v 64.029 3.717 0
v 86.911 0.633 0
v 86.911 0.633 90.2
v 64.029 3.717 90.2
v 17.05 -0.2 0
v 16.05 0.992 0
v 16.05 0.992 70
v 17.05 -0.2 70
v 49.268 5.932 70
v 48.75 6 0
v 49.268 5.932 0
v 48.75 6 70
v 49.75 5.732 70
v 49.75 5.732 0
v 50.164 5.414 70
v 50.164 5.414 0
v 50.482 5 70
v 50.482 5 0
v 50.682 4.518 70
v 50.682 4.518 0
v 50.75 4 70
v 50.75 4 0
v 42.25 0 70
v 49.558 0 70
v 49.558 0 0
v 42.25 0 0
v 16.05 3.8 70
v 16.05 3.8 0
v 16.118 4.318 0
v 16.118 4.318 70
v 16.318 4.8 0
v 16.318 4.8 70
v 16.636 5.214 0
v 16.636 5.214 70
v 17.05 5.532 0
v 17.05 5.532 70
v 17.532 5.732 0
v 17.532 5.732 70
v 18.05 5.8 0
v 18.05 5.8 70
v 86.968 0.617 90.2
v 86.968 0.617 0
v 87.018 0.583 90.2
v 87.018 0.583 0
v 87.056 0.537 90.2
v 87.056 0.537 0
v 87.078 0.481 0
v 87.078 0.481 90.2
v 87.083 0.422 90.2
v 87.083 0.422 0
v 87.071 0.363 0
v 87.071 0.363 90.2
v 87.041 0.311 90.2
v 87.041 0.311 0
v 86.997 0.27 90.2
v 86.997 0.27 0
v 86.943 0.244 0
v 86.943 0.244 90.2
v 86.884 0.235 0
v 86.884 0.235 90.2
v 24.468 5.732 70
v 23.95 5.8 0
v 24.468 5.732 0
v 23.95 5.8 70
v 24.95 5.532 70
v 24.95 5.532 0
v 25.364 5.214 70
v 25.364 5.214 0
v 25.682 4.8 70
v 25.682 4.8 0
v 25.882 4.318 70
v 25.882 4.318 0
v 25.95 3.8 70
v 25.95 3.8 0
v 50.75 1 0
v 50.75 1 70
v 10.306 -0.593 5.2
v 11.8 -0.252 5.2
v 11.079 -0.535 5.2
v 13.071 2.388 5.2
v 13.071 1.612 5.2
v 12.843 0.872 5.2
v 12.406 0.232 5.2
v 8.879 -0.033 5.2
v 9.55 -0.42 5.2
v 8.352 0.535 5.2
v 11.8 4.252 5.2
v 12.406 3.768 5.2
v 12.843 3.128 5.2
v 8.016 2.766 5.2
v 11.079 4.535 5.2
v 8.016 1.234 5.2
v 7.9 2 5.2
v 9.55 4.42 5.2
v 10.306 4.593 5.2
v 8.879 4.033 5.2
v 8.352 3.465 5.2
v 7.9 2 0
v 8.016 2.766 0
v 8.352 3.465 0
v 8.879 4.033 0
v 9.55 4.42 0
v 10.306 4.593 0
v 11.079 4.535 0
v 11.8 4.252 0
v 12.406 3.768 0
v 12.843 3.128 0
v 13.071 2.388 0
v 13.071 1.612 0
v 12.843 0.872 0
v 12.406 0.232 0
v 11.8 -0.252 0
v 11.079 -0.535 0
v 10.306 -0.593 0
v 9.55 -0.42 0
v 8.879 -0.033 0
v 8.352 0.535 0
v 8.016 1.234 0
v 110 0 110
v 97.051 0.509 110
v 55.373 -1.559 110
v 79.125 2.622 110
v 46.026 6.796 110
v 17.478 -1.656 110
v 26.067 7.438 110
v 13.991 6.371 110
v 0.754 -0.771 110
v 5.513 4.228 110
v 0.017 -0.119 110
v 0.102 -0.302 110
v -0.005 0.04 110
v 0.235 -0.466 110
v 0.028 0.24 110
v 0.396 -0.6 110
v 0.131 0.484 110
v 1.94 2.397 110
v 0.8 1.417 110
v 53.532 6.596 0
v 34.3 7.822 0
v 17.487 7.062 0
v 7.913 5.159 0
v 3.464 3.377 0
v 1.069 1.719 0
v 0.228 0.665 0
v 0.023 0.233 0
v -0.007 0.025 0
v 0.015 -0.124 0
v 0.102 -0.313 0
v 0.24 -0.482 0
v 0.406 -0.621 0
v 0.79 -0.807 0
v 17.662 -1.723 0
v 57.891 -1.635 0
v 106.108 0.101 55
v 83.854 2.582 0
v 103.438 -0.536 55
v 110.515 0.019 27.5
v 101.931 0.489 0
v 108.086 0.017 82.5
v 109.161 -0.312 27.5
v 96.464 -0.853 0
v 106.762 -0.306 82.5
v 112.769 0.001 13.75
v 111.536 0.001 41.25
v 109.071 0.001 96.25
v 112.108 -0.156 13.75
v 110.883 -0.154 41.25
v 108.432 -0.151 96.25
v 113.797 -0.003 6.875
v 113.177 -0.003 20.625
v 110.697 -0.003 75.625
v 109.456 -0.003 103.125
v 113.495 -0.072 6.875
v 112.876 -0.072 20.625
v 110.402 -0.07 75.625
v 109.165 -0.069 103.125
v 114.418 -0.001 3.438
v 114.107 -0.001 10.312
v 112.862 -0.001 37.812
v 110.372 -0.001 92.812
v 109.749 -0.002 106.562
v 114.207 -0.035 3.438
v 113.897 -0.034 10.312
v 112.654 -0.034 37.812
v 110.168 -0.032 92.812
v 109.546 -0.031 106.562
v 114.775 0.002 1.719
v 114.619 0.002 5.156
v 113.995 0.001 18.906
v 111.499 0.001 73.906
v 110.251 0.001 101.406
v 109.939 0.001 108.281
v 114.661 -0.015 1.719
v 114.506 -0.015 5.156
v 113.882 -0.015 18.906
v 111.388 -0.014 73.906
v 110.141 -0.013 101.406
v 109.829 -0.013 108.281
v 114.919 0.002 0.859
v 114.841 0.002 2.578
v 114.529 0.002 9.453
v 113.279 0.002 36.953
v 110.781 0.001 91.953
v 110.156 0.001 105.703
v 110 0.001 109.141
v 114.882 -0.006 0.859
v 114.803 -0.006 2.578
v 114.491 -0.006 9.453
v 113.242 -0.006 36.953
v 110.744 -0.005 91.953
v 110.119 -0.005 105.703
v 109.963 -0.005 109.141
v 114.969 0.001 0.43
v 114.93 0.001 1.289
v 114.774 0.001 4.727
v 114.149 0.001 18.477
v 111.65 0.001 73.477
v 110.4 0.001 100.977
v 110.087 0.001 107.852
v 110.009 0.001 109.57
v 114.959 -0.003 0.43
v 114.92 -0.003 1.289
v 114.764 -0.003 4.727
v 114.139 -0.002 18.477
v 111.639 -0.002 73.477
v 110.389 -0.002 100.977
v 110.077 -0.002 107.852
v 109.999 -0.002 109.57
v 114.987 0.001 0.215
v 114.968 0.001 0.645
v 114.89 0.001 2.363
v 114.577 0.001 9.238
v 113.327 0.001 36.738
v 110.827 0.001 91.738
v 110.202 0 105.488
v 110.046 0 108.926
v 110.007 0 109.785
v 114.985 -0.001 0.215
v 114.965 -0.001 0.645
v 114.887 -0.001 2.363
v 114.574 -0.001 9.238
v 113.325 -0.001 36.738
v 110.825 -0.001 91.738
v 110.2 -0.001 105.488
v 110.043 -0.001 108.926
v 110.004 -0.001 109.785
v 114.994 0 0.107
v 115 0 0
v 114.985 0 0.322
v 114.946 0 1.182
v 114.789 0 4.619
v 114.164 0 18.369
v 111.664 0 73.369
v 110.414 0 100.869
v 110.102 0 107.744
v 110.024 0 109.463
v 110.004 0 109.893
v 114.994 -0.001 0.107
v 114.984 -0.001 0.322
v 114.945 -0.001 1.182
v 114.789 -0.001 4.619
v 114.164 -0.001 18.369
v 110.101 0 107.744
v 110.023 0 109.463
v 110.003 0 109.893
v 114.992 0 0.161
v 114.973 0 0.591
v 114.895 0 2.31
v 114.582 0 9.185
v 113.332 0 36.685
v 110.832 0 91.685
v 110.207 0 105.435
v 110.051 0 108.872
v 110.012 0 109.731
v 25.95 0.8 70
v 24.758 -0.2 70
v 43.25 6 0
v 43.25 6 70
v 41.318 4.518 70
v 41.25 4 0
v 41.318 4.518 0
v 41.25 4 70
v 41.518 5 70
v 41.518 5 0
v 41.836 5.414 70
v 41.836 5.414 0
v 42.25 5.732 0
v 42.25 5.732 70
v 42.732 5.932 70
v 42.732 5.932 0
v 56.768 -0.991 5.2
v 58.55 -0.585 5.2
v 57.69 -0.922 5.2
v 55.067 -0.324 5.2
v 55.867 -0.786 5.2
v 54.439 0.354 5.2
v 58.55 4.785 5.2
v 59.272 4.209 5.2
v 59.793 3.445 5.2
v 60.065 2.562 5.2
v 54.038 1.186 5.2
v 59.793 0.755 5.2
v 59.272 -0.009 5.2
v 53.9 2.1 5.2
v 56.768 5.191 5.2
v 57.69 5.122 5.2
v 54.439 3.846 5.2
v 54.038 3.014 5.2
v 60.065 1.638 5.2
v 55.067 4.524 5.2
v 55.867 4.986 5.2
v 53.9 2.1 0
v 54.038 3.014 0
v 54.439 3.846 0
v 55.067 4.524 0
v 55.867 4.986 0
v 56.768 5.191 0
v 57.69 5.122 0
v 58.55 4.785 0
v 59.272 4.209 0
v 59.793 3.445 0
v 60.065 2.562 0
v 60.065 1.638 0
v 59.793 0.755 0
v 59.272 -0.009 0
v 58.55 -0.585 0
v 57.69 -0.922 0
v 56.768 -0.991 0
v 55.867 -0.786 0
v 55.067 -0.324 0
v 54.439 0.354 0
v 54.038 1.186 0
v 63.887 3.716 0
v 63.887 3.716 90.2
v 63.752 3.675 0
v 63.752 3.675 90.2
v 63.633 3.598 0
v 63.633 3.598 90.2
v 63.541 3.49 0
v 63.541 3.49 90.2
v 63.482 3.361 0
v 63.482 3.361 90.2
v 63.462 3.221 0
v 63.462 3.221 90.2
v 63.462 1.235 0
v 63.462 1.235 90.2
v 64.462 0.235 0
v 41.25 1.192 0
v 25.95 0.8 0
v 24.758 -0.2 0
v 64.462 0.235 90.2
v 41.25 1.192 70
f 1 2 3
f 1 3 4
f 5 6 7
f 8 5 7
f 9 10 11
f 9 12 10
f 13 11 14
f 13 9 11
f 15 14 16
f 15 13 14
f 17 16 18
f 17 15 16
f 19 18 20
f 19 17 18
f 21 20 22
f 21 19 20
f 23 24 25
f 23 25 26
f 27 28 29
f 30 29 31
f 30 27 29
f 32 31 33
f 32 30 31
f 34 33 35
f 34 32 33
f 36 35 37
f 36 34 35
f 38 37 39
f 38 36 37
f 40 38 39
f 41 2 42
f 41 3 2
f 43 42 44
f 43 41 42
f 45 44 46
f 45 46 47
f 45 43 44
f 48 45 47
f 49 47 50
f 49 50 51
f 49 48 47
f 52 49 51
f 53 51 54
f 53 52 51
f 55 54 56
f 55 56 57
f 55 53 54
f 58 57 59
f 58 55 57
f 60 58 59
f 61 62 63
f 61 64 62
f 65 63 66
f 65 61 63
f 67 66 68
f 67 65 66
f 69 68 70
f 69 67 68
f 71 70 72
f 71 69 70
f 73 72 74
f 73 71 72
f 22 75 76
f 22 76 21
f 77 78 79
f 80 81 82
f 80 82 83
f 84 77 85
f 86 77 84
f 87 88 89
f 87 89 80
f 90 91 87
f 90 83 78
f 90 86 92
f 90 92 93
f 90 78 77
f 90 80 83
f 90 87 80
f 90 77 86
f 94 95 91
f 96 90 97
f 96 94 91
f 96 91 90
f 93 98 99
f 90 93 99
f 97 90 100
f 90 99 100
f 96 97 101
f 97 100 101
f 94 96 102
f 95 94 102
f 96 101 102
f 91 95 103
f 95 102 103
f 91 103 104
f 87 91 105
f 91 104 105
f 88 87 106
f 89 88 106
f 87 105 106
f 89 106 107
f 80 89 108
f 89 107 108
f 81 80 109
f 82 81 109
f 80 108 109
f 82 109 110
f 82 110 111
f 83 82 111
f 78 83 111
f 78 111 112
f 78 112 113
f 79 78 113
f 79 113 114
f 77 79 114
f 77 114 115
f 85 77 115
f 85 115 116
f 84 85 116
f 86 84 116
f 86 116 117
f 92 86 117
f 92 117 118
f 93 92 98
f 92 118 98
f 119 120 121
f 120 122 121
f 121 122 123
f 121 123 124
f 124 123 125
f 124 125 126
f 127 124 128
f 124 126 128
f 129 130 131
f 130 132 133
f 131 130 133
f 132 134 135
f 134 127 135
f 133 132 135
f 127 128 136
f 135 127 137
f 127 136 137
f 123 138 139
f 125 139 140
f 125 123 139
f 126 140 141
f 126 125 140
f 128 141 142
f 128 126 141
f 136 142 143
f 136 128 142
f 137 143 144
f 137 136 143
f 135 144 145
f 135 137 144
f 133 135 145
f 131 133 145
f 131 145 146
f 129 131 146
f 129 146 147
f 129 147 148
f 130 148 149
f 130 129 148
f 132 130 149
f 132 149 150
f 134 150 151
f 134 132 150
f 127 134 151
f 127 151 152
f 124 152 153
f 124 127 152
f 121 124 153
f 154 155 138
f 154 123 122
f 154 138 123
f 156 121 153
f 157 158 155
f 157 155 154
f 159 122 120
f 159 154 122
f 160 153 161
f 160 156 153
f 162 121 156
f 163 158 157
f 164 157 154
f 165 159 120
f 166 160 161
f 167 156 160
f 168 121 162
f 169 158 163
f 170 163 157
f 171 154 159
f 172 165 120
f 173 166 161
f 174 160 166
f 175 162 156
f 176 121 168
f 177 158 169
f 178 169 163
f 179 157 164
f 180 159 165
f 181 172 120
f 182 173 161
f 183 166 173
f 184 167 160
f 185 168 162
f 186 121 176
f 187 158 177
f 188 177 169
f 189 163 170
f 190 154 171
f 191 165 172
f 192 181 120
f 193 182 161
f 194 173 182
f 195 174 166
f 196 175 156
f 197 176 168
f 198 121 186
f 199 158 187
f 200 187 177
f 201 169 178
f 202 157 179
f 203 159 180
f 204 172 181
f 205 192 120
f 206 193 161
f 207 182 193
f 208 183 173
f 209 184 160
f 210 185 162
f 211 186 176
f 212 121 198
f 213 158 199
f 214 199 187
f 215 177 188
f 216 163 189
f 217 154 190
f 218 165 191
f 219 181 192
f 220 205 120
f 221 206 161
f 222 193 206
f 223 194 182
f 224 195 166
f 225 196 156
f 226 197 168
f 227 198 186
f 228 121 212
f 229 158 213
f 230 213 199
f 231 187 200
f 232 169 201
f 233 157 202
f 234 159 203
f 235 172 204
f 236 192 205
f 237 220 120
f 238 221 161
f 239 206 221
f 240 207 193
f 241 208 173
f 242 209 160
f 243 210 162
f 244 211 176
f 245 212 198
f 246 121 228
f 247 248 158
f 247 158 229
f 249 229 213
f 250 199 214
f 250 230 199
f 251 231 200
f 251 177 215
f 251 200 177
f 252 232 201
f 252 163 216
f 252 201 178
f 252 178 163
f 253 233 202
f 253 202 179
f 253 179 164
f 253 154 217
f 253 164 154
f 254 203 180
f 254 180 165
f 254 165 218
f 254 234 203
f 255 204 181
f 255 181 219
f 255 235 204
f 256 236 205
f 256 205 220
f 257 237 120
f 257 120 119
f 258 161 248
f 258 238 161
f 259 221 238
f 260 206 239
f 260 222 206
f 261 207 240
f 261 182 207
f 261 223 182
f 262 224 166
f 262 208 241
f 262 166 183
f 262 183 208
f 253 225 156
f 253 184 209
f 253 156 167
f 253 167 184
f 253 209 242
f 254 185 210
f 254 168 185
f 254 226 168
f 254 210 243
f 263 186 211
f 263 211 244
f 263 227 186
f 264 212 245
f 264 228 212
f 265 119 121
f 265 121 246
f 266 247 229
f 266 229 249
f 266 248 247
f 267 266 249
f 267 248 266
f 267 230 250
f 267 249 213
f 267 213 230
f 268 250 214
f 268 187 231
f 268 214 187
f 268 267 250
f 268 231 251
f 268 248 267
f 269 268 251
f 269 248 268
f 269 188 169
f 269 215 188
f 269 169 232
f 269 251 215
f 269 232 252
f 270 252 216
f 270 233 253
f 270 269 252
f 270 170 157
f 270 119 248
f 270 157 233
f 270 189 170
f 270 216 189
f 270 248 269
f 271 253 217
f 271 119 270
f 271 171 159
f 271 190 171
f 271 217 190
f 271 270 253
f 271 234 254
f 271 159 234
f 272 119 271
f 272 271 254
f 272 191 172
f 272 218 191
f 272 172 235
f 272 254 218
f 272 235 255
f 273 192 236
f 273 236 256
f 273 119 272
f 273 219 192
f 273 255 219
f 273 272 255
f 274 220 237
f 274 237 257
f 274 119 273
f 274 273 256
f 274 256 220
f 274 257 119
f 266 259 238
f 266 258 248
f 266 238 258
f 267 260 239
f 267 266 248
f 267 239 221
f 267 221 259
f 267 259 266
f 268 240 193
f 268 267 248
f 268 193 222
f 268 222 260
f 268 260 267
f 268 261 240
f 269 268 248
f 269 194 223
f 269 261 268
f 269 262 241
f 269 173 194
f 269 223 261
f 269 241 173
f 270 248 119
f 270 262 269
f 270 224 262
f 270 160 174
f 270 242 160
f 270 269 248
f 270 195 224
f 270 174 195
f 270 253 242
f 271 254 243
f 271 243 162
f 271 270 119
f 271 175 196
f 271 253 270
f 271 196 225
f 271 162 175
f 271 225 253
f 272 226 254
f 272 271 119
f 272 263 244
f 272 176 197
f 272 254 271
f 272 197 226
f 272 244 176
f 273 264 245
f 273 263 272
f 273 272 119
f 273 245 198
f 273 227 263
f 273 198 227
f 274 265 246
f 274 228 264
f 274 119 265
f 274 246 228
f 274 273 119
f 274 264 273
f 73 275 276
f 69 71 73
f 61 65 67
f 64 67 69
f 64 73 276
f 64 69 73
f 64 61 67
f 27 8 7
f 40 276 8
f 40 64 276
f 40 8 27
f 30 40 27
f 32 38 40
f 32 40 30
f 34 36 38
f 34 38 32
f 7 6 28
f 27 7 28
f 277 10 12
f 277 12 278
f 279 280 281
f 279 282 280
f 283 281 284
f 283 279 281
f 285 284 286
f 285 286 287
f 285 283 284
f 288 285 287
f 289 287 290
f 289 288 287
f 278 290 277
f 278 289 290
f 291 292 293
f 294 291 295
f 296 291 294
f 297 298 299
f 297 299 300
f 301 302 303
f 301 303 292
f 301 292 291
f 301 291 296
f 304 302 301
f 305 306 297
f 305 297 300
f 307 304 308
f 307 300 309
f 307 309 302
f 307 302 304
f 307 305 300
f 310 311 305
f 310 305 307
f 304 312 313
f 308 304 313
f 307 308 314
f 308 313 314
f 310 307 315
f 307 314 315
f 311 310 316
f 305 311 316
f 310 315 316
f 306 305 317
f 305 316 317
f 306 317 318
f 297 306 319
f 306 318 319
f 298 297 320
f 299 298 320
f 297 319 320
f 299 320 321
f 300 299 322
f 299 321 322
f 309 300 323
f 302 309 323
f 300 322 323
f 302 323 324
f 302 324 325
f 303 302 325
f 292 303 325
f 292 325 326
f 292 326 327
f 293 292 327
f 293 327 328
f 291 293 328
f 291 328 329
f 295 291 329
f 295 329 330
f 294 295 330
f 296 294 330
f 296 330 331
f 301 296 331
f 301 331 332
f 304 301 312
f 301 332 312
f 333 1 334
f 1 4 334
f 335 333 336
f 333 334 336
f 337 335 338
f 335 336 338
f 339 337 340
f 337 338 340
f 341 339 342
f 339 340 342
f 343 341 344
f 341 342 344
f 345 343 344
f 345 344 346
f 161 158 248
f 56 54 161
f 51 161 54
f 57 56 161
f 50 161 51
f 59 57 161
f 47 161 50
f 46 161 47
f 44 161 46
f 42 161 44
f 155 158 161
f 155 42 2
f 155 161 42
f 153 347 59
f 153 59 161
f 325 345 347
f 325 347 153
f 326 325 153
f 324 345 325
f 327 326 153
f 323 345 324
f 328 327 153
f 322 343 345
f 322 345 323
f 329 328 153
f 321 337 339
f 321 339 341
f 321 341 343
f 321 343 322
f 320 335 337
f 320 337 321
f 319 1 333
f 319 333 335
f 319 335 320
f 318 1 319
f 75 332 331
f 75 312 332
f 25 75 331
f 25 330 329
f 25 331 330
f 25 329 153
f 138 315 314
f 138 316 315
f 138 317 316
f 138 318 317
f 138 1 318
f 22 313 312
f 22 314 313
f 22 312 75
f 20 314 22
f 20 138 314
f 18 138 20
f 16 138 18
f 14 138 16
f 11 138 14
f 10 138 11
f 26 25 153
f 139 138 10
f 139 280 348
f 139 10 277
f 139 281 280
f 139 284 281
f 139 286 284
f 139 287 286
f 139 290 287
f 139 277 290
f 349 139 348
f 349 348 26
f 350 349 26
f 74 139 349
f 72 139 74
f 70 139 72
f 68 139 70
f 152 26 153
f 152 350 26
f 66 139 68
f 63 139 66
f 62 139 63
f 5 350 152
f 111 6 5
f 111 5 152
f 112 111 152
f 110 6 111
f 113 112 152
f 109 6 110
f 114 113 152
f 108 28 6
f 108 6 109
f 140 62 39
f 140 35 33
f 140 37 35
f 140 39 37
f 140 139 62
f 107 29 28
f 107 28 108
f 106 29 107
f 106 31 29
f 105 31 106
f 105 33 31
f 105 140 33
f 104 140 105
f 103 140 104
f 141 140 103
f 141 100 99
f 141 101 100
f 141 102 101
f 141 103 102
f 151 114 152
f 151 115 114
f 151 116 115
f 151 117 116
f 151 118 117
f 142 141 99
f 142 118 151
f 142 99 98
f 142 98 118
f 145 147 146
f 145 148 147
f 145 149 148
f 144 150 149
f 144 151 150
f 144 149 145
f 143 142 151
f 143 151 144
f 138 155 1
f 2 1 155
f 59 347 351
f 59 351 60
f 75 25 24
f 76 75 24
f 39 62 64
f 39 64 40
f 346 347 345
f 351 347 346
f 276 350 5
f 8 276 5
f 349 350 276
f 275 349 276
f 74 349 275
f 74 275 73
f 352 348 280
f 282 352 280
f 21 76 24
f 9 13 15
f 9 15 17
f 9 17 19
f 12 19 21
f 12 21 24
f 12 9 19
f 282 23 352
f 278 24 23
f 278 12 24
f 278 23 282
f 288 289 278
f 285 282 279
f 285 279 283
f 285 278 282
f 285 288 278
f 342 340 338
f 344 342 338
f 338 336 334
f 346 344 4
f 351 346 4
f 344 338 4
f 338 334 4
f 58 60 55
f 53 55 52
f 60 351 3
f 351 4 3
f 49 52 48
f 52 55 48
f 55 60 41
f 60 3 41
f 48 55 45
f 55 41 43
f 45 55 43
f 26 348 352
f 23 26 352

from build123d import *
from OCP.BRepFilletAPI import BRepFilletAPI_MakeChamfer

# Parameters (mm, degrees)
SKETCH4_R          = 2.6
SKETCH4_R_2        = 3.1
CUT_EXTRUDE1_DEPTH = 5.2
SKETCH5_W          = 9.9
SKETCH5_H          = 6
SKETCH5_W_2        = 9.5
CUT_EXTRUDE2_DEPTH = 70
FILLET3_R          = 2
CHAMFER1_SIZE      = 1
CHAMFER1_SIZE2     = 1.191753593
CUT_EXTRUDE3_DEPTH = 90.2
FILLET4_R          = 0.2
FILLET5_R          = 0.5
CHAMFER2_SIZE      = 1


with BuildPart() as part:
    # Sketch1 → Loft1 section 0
    with BuildSketch(Plane.XY):
        with BuildLine():
            add(Edge.make_bspline(
                [(115, 0), (114.999913382, 0.00327866), (114.222934603, -0.004567066), (113.418136575, 0.000318408), (111.44543546, 0.018706002), (108.999380922, 0.080565277), (105.780115155, 0.203144323), (101.978037922, 0.467320429), (97.63148646, 0.880990765), (92.843812566, 1.427373326), (87.693014802, 2.062174327), (82.26127365, 2.794917392), (76.628898252, 3.582200475), (70.875421432, 4.408274793), (65.069516957, 5.204495648), (59.272555938, 5.964988559), (53.535411353, 6.612069385), (47.902032041, 7.147901639), (42.420677472, 7.538059951), (37.125743857, 7.784294524), (32.060080889, 7.863888962), (27.260899934, 7.799703202), (22.764274035, 7.585443948), (18.606628598, 7.224009749), (14.819582747, 6.717397261), (11.43119341, 6.102885155), (8.463318021, 5.359495242), (5.929953708, 4.523167874), (3.840235227, 3.611431652), (2.203139301, 2.680524392), (0.997143498, 1.719388226), (0.306055902, 0.84473605), (-0.153897847, -0.016785493), (0.441131195, -0.783771302), (1.630250645, -0.976182526), (3.345026164, -1.247099953), (5.741349663, -1.385446358), (8.741002332, -1.531007587), (12.32356917, -1.613427576), (16.426146399, -1.711956772), (20.996614723, -1.764001286), (25.979915364, -1.804105207), (31.316658928, -1.826220598), (36.950031377, -1.811871436), (42.810070502, -1.783755804), (48.833365319, -1.730024981), (54.950109545, -1.67348399), (61.093513049, -1.595166549), (67.193299365, -1.488121719), (73.176935484, -1.397778739), (78.980025922, -1.271232402), (84.533413271, -1.152999753), (89.776869938, -1.037364871), (94.647010434, -0.905039683), (99.089599698, -0.778312882), (103.055602703, -0.646322839), (106.488295637, -0.529569147), (109.391284428, -0.370730171), (111.629000068, -0.244208643), (113.467096811, -0.099576309), (114.237158295, -0.036931621), (115.000086752, -0.003283716), (115, 0)],
                knots=[0, 0, 0, 0, 0.001545172, 0.006223608, 0.014035782, 0.024855049, 0.038644124, 0.055163693, 0.074045466, 0.094820373, 0.117222732, 0.140866367, 0.165395395, 0.190452399, 0.215710088, 0.240854358, 0.265734023, 0.290048364, 0.313714428, 0.336486101, 0.358292895, 0.378940292, 0.398278007, 0.416246563, 0.432660408, 0.447459903, 0.460566131, 0.472021733, 0.481783695, 0.489844359, 0.496307136, 0.50126117, 0.504695153, 0.507385543, 0.512190444, 0.519692984, 0.529980259, 0.542956454, 0.558414131, 0.576101982, 0.595804604, 0.61726601, 0.64027206, 0.66452271, 0.689803764, 0.7157292, 0.742084221, 0.768568973, 0.794840399, 0.820639753, 0.845625339, 0.869581038, 0.892163588, 0.913159587, 0.932310678, 0.94940252, 0.964220925, 0.976641917, 0.986532119, 0.993892864, 0.998452446, 1, 1, 1, 1], degree=3))
        make_face()
    # Sketch2 → Loft1 section 1
    with BuildSketch(Plane.XY.offset(110)):
        with BuildLine():
            add(Edge.make_bspline(
                [(110, 0), (110.000464145, 0.002638021), (109.253557002, -0.006421882), (108.485306247, 0.00202473), (106.599515685, 0.014018922), (104.259903283, 0.071192731), (101.178986874, 0.200889618), (97.542661477, 0.451950761), (93.384633146, 0.843539364), (88.805204424, 1.362015696), (83.880374164, 1.978555721), (78.68657223, 2.677523385), (73.299477431, 3.430735281), (67.795235431, 4.215247142), (62.241233075, 4.984660857), (56.695525551, 5.697469803), (51.207787306, 6.322755672), (45.821489693, 6.833626486), (40.577824462, 7.211562863), (35.514283248, 7.444282984), (30.668486135, 7.527509184), (26.076763803, 7.463490784), (21.77566696, 7.255221358), (17.798933432, 6.909184212), (14.177047879, 6.430194992), (10.935139134, 5.831964767), (8.094704102, 5.122344568), (5.670248347, 4.327180111), (3.669790047, 3.460558372), (2.10909167, 2.56151381), (0.952680778, 1.647952784), (0.292493833, 0.810328248), (-0.144477468, -0.013443729), (0.421457768, -0.751792674), (1.561430619, -0.927732015), (3.196411713, -1.199647616), (5.489901797, -1.325203312), (8.359384575, -1.457341268), (11.786506209, -1.55318322), (15.712038629, -1.632817261), (20.085890157, -1.693490267), (24.85332264, -1.730533844), (29.958495668, -1.745317698), (35.344133299, -1.736641885), (40.949025669, -1.70754651), (46.710109342, -1.660092686), (52.562107594, -1.595708584), (58.438334584, -1.519615465), (64.272360823, -1.429130605), (69.997133878, -1.329443239), (75.548112692, -1.222377083), (80.861507128, -1.10840335), (85.876724326, -0.990587124), (90.536246874, -0.869398239), (94.784781842, -0.746694986), (98.577741113, -0.621781265), (101.858350076, -0.496229968), (104.635869759, -0.366297292), (106.773720091, -0.224338993), (108.53252638, -0.099668194), (109.269457647, -0.031974616), (109.999539654, -0.002616432), (110, 0)],
                knots=[0, 0, 0, 0, 0.001564721, 0.006239121, 0.014018617, 0.024861007, 0.038659987, 0.055174427, 0.074046407, 0.094837256, 0.117226118, 0.14085626, 0.165386109, 0.19045125, 0.215702393, 0.240866612, 0.265718976, 0.290051983, 0.313696202, 0.33648442, 0.358279861, 0.378929437, 0.398292398, 0.416235766, 0.432650472, 0.447455618, 0.460592079, 0.472030369, 0.48177877, 0.489853088, 0.496315276, 0.501246195, 0.504684904, 0.507403743, 0.512183233, 0.519672773, 0.529968131, 0.54294809, 0.558399818, 0.576099165, 0.595810572, 0.617282889, 0.64027984, 0.664535393, 0.689783385, 0.715732831, 0.742092653, 0.768566703, 0.794844175, 0.820638712, 0.845644257, 0.86958445, 0.892182833, 0.913177877, 0.932327829, 0.949410904, 0.964230176, 0.976629486, 0.986536787, 0.993881551, 0.998448084, 1, 1, 1, 1], degree=3))
        make_face()
    loft()

    # Sketch4 → Cut-Extrude1 (cut)
    with BuildSketch(Plane(origin=(0, 0, 0), x_dir=(-1, 0, 0), z_dir=(0, 0, -1))):
        with Locations((-10.5, 2)):
            Circle(SKETCH4_R)
        with Locations((-57, 2.1)):
            Circle(SKETCH4_R_2)
    extrude(amount=-CUT_EXTRUDE1_DEPTH, mode=Mode.SUBTRACT)

    # Sketch5 → Cut-Extrude2 (cut)
    with BuildSketch(Plane(origin=(0, 0, 0), x_dir=(-1, 0, 0), z_dir=(0, 0, -1))):
        with Locations((-21, 2.8)):
            Rectangle(SKETCH5_W, SKETCH5_H)
        with Locations((-46, 3)):
            Rectangle(SKETCH5_W_2, SKETCH5_H)
    extrude(amount=-CUT_EXTRUDE2_DEPTH, mode=Mode.SUBTRACT)

    # Fillet3
    fillet3_edges = [part.edges().sort_by_distance(p)[0] for p in [
        (16.05, 5.8, 35),
        (25.95, 5.8, 35),
        (41.25, 6, 35),
        (50.75, 6, 35),
    ]]
    fillet(fillet3_edges, radius=FILLET3_R)

    # Chamfer1: one chamfer whose edges measure the first distance from different faces: ONE call of the kernel's chamfer builder (chamfer() names one face for all edges)
    chamfer1_edges_1 = [part.edges().sort_by_distance(p)[0] for p in [
        (16.05, -0.2, 35),
    ]]
    chamfer1_side_1 = [part.faces().sort_by_distance(p)[0] for p in [
        (21, -0.2, 35),
    ]]
    chamfer1_edges_2 = [part.edges().sort_by_distance(p)[0] for p in [
        (25.95, -0.2, 35),
    ]]
    chamfer1_side_2 = [part.faces().sort_by_distance(p)[0] for p in [
        (25.95, 1.8, 35),
    ]]
    chamfer1_edges_3 = [part.edges().sort_by_distance(p)[0] for p in [
        (41.25, 0, 35),
    ]]
    chamfer1_side_3 = [part.faces().sort_by_distance(p)[0] for p in [
        (46, 0, 35),
    ]]
    chamfer1_edges_4 = [part.edges().sort_by_distance(p)[0] for p in [
        (50.75, 0, 35),
    ]]
    chamfer1_side_4 = [part.faces().sort_by_distance(p)[0] for p in [
        (50.75, 2, 35),
    ]]
    chamfer1 = BRepFilletAPI_MakeChamfer(part.part.solid().wrapped)
    for e in chamfer1_edges_1:
        chamfer1.Add(CHAMFER1_SIZE, CHAMFER1_SIZE2, e.wrapped, chamfer1_side_1[0].wrapped)  # the first distance lies on this face
    for e in chamfer1_edges_2:
        chamfer1.Add(CHAMFER1_SIZE, CHAMFER1_SIZE2, e.wrapped, chamfer1_side_2[0].wrapped)  # the first distance lies on this face
    for e in chamfer1_edges_3:
        chamfer1.Add(CHAMFER1_SIZE, CHAMFER1_SIZE2, e.wrapped, chamfer1_side_3[0].wrapped)  # the first distance lies on this face
    for e in chamfer1_edges_4:
        chamfer1.Add(CHAMFER1_SIZE, CHAMFER1_SIZE2, e.wrapped, chamfer1_side_4[0].wrapped)  # the first distance lies on this face
    add(Compound.cast(chamfer1.Shape()), mode=Mode.REPLACE)

    # Sketch6 → Cut-Extrude3 (cut)
    with BuildSketch(Plane(origin=(0, 0, 0), x_dir=(-1, 0, 0), z_dir=(0, 0, -1))):
        Polygon((-63.462295223, 3.793174257), (-63.462295223, 0.235158592), (-89.865630471, 0.235158592), align=None)
    extrude(amount=-CUT_EXTRUDE3_DEPTH, mode=Mode.SUBTRACT)

    # Fillet4
    fillet4_edges = [part.edges().sort_by_distance(p)[0] for p in [
        (89.865630471, 0.235158592, 45.1),
    ]]
    fillet(fillet4_edges, radius=FILLET4_R)

    # Fillet5
    fillet5_edges = [part.edges().sort_by_distance(p)[0] for p in [
        (63.462295223, 3.793174257, 45.1),
    ]]
    fillet(fillet5_edges, radius=FILLET5_R)

    # Chamfer2
    chamfer2_edges = [part.edges().sort_by_distance(p)[0] for p in [
        (63.462295223, 0.235158592, 45.1),
    ]]
    chamfer(chamfer2_edges, length=CHAMFER2_SIZE)


solid = part.part
